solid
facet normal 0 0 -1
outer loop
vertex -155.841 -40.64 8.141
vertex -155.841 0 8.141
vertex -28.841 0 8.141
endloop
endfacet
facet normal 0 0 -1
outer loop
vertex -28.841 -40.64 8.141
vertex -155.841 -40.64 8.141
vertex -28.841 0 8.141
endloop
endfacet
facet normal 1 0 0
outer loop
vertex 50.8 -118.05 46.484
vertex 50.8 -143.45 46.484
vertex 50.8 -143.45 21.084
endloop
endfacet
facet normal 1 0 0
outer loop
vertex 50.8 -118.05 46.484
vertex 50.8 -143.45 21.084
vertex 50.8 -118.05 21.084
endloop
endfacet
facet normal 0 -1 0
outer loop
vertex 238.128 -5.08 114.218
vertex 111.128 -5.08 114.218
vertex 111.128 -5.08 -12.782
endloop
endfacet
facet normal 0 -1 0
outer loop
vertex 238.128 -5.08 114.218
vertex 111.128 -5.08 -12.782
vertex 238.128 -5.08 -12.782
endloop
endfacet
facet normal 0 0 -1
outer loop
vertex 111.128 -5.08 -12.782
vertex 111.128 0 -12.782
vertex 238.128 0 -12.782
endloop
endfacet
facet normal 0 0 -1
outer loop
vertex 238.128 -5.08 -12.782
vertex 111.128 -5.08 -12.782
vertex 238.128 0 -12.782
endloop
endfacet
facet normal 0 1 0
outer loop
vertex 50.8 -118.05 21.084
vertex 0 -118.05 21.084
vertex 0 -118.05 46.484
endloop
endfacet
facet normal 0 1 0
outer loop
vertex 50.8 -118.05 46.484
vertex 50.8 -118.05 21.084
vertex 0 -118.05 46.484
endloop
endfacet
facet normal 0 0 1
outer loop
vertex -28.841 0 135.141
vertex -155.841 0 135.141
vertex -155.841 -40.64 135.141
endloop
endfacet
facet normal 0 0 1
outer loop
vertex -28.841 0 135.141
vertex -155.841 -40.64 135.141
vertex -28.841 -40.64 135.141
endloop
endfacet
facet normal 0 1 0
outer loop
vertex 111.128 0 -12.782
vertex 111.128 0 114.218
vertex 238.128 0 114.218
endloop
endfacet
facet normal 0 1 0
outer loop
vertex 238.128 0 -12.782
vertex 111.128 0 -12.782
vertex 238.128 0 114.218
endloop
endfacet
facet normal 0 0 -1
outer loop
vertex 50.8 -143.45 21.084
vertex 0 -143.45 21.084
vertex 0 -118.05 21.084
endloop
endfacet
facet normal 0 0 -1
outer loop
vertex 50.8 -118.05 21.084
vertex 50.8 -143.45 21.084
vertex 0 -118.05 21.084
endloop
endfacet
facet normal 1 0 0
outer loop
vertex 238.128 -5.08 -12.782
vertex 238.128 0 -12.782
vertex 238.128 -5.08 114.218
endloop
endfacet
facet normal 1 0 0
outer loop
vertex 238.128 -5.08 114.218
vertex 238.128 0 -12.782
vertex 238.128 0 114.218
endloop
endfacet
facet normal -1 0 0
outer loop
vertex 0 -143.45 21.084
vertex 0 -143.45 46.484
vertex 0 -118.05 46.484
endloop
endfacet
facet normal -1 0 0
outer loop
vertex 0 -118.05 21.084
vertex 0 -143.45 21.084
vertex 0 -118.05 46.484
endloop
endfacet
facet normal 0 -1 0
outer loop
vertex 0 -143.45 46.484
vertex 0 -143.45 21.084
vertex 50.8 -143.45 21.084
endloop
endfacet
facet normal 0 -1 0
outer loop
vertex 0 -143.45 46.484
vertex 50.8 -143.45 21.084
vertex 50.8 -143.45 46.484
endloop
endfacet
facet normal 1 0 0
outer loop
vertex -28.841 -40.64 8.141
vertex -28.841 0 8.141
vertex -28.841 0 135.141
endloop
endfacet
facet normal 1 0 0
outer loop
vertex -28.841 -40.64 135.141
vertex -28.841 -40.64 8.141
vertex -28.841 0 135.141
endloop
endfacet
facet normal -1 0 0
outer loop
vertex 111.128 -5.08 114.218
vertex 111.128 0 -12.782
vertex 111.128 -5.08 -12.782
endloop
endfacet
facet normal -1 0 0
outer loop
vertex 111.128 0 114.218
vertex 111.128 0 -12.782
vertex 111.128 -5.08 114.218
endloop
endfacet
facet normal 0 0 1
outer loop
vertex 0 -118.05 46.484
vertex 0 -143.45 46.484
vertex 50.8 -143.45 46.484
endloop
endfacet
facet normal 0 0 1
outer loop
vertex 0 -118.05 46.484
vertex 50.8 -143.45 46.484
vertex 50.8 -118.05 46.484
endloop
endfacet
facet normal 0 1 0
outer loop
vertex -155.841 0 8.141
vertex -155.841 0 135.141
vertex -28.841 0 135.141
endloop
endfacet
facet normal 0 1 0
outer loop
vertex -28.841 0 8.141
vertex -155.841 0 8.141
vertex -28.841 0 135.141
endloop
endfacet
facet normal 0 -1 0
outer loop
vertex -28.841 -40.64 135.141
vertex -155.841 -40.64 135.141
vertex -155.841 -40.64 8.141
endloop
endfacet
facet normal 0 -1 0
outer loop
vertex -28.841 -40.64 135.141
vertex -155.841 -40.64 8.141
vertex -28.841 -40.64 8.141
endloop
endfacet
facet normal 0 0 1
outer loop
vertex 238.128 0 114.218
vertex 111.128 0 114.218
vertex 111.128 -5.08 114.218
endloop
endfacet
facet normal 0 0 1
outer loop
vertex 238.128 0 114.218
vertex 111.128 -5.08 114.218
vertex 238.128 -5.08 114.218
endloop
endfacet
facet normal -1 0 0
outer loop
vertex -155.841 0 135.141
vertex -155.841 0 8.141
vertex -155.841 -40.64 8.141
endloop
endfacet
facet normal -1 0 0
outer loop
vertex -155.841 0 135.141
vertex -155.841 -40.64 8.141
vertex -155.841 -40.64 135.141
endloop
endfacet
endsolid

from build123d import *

# Parameters (mm, degrees)
F0_W     = 127
F0_H     = 127
F1_DEPTH = 40.64
F2_W     = 25.4
F2_H     = 25.4
F3_DEPTH = 50.8
F4_W     = 127
F4_H     = 127
F5_DEPTH = 5.08


with BuildPart() as f1:
    # F0 (on Front) → F1 (new body)
    with BuildSketch(Plane.XZ):
        with Locations((-92.340814, 71.640552)):
            Rectangle(F0_W, F0_H)
    extrude(amount=F1_DEPTH)


with BuildPart() as f3:
    # F2 (on Right) → F3 (new body)
    with BuildSketch(Plane.YZ):
        with Locations((-130.749674, 33.784234)):
            Rectangle(F2_W, F2_H)
    extrude(amount=F3_DEPTH)


with BuildPart() as f5:
    # F4 (on Front) → F5 (new body)
    with BuildSketch(Plane.XZ):
        with Locations((174.628353, 50.717524)):
            Rectangle(F4_W, F4_H)
    extrude(amount=F5_DEPTH)


solid = Compound([f1.part, f3.part, f5.part])
